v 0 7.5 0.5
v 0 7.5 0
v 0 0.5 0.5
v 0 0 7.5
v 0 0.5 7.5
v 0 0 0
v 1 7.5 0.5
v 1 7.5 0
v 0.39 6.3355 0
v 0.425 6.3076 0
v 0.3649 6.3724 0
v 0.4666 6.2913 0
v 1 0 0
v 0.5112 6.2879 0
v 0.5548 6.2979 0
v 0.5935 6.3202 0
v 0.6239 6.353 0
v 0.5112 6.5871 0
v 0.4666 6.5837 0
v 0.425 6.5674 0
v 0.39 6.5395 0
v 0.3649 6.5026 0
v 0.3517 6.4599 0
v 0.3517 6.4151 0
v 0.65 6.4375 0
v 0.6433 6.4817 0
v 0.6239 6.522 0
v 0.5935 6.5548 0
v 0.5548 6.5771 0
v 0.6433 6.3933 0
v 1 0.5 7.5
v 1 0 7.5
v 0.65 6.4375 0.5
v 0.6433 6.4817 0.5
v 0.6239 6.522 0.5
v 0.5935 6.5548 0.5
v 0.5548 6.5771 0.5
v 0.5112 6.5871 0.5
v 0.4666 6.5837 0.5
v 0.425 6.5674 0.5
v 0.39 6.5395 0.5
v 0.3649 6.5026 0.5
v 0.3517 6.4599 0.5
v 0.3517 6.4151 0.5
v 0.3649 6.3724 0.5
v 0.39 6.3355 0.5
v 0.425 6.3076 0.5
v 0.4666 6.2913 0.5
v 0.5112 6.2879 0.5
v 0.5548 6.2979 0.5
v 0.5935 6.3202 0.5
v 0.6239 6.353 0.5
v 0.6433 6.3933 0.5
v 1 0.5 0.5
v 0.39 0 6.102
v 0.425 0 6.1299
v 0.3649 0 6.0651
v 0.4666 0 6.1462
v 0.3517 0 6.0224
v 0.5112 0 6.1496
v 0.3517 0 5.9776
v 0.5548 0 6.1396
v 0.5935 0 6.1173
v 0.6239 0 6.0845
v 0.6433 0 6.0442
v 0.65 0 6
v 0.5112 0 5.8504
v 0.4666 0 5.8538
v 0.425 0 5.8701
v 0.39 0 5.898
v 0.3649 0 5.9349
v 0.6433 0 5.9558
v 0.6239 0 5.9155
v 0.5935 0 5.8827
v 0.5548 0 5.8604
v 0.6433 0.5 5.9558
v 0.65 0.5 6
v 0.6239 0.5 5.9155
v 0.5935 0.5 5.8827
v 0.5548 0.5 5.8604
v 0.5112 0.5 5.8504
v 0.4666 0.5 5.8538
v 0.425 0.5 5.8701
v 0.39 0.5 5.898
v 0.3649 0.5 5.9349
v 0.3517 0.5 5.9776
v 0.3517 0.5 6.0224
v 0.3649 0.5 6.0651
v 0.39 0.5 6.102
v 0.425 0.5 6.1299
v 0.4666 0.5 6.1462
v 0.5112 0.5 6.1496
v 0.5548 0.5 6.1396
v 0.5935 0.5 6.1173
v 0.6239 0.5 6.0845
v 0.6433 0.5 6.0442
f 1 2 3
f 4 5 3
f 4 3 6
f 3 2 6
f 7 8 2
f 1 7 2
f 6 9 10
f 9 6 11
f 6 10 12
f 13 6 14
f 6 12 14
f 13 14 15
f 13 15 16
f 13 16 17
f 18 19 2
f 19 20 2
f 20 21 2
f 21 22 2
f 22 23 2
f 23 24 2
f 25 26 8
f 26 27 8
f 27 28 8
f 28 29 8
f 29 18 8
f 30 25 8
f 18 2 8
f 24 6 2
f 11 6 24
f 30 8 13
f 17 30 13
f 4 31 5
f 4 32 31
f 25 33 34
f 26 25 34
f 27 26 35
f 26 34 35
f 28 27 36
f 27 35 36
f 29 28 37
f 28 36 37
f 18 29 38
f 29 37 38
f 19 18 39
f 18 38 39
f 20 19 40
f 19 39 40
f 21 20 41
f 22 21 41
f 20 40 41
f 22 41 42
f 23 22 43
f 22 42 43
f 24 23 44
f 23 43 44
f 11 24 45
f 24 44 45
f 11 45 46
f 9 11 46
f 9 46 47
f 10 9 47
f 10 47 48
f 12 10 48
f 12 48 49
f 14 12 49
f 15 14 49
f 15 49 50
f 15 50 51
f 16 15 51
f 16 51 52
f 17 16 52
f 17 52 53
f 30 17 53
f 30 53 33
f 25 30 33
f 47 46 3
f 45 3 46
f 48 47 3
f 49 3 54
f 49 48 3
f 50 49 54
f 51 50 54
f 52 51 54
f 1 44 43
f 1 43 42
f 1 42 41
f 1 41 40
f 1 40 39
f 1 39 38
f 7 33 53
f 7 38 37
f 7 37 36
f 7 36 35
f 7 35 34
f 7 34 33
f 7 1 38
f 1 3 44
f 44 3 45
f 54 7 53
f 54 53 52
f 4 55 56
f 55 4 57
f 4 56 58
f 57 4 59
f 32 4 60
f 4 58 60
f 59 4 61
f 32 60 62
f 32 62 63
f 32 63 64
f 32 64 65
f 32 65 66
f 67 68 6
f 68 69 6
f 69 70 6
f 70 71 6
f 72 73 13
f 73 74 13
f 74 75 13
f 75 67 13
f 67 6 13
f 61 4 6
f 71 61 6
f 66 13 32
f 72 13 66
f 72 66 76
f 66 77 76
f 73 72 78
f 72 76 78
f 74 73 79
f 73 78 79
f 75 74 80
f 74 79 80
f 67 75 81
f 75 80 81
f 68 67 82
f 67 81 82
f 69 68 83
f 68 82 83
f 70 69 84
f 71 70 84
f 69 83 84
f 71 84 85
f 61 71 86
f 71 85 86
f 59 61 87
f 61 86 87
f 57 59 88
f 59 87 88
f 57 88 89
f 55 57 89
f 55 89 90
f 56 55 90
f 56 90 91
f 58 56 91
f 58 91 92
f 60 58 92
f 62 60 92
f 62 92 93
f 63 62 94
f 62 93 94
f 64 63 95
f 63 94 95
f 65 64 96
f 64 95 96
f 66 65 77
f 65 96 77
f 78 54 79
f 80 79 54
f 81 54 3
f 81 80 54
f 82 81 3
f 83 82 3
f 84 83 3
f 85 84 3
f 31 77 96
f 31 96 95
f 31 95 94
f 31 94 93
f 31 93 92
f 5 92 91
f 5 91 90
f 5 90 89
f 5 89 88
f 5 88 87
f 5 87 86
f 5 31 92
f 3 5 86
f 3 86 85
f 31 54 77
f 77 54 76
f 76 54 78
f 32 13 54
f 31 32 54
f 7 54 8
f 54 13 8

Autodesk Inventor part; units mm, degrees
ref_plane "YZ Plane" through (0, 0, 0) normal (1, 0, 0) x (0, 1, 0)
ref_plane "XZ Plane" through (0, 0, 0) normal (0, 1, 0) x (-1, 0, 0)
ref_plane "XY Plane" through (0, 0, 0) normal (0, 0, 1) x (1, 0, 0)
sketch "Sketch1" plane through (0, 0, 0) normal (0, 0, 1) x (1, 0, 0)
  line L0 (0, 0) -> (1, 0)
  line L1 (1, 0) -> (1, 7.5)
  line L2 (1, 7.5) -> (0, 7.5)
  line L3 (0, 7.5) -> (0, 0)
  dimension "d0" = 1
  dimension "d1" = 7.5
extrude "Extrusion1" add sketch "Sketch1" along normal blind 0.5
sketch "Sketch2" plane through (0, 0, 0) normal (-1, 0, 0) x (0, 0, 1)
  point P0 (0, 0)
sketch "Sketch3" plane through (0, 0, 0) normal (0, 1, 0) x (-1, 0, 0)
  line L0 (0, 0) -> (-1, 0) projected
  line L1 (0, 0) -> (-1, 0)
  line L2 (-1, 0) -> (-1, 7.5)
  line L3 (-1, 7.5) -> (0, 7.5)
  line L4 (0, 7.5) -> (0, 0)
  dimension "d4" = 1
  dimension "d5" = 7.5
extrude "Extrusion2" add sketch "Sketch3" along normal blind 0.5
sketch "Sketch4" plane through (0, 0, 0.5) normal (0, 0, 1) x (1, 0, 0)
  line L0 (0, 7.9375) -> (0, 6.4375)
  line L1 (0, 6.4375) -> (0.5, 6.4375)
  circle A0 centre (0.5, 6.4375) radius 0.15
  point P0 (0, 0)
  dimension "d8" = 1.5
  dimension "d9" = 0.5
  dimension "d10" = 0.3
extrude "Extrusion3" cut sketch "Sketch4" against normal through all
sketch "Sketch5" plane through (0, 0.5, 0) normal (0, 1, 0) x (1, 0, 0)
  line L0 (0, 0) -> (0, -7.5) projected
  line L1 (0, -7.5) -> (0, -6)
  line L2 (0, -6) -> (0.5, -6)
  line L3 (1, 0) -> (1, -7.5) projected
  circle A0 centre (0.5, -6) radius 0.15
  dimension "d13" = 1.5
  dimension "d14" = 0.5
  dimension "d15" = 0.3
extrude "Extrusion4" cut sketch "Sketch5" against normal through all
properties part number "CLAMP"
